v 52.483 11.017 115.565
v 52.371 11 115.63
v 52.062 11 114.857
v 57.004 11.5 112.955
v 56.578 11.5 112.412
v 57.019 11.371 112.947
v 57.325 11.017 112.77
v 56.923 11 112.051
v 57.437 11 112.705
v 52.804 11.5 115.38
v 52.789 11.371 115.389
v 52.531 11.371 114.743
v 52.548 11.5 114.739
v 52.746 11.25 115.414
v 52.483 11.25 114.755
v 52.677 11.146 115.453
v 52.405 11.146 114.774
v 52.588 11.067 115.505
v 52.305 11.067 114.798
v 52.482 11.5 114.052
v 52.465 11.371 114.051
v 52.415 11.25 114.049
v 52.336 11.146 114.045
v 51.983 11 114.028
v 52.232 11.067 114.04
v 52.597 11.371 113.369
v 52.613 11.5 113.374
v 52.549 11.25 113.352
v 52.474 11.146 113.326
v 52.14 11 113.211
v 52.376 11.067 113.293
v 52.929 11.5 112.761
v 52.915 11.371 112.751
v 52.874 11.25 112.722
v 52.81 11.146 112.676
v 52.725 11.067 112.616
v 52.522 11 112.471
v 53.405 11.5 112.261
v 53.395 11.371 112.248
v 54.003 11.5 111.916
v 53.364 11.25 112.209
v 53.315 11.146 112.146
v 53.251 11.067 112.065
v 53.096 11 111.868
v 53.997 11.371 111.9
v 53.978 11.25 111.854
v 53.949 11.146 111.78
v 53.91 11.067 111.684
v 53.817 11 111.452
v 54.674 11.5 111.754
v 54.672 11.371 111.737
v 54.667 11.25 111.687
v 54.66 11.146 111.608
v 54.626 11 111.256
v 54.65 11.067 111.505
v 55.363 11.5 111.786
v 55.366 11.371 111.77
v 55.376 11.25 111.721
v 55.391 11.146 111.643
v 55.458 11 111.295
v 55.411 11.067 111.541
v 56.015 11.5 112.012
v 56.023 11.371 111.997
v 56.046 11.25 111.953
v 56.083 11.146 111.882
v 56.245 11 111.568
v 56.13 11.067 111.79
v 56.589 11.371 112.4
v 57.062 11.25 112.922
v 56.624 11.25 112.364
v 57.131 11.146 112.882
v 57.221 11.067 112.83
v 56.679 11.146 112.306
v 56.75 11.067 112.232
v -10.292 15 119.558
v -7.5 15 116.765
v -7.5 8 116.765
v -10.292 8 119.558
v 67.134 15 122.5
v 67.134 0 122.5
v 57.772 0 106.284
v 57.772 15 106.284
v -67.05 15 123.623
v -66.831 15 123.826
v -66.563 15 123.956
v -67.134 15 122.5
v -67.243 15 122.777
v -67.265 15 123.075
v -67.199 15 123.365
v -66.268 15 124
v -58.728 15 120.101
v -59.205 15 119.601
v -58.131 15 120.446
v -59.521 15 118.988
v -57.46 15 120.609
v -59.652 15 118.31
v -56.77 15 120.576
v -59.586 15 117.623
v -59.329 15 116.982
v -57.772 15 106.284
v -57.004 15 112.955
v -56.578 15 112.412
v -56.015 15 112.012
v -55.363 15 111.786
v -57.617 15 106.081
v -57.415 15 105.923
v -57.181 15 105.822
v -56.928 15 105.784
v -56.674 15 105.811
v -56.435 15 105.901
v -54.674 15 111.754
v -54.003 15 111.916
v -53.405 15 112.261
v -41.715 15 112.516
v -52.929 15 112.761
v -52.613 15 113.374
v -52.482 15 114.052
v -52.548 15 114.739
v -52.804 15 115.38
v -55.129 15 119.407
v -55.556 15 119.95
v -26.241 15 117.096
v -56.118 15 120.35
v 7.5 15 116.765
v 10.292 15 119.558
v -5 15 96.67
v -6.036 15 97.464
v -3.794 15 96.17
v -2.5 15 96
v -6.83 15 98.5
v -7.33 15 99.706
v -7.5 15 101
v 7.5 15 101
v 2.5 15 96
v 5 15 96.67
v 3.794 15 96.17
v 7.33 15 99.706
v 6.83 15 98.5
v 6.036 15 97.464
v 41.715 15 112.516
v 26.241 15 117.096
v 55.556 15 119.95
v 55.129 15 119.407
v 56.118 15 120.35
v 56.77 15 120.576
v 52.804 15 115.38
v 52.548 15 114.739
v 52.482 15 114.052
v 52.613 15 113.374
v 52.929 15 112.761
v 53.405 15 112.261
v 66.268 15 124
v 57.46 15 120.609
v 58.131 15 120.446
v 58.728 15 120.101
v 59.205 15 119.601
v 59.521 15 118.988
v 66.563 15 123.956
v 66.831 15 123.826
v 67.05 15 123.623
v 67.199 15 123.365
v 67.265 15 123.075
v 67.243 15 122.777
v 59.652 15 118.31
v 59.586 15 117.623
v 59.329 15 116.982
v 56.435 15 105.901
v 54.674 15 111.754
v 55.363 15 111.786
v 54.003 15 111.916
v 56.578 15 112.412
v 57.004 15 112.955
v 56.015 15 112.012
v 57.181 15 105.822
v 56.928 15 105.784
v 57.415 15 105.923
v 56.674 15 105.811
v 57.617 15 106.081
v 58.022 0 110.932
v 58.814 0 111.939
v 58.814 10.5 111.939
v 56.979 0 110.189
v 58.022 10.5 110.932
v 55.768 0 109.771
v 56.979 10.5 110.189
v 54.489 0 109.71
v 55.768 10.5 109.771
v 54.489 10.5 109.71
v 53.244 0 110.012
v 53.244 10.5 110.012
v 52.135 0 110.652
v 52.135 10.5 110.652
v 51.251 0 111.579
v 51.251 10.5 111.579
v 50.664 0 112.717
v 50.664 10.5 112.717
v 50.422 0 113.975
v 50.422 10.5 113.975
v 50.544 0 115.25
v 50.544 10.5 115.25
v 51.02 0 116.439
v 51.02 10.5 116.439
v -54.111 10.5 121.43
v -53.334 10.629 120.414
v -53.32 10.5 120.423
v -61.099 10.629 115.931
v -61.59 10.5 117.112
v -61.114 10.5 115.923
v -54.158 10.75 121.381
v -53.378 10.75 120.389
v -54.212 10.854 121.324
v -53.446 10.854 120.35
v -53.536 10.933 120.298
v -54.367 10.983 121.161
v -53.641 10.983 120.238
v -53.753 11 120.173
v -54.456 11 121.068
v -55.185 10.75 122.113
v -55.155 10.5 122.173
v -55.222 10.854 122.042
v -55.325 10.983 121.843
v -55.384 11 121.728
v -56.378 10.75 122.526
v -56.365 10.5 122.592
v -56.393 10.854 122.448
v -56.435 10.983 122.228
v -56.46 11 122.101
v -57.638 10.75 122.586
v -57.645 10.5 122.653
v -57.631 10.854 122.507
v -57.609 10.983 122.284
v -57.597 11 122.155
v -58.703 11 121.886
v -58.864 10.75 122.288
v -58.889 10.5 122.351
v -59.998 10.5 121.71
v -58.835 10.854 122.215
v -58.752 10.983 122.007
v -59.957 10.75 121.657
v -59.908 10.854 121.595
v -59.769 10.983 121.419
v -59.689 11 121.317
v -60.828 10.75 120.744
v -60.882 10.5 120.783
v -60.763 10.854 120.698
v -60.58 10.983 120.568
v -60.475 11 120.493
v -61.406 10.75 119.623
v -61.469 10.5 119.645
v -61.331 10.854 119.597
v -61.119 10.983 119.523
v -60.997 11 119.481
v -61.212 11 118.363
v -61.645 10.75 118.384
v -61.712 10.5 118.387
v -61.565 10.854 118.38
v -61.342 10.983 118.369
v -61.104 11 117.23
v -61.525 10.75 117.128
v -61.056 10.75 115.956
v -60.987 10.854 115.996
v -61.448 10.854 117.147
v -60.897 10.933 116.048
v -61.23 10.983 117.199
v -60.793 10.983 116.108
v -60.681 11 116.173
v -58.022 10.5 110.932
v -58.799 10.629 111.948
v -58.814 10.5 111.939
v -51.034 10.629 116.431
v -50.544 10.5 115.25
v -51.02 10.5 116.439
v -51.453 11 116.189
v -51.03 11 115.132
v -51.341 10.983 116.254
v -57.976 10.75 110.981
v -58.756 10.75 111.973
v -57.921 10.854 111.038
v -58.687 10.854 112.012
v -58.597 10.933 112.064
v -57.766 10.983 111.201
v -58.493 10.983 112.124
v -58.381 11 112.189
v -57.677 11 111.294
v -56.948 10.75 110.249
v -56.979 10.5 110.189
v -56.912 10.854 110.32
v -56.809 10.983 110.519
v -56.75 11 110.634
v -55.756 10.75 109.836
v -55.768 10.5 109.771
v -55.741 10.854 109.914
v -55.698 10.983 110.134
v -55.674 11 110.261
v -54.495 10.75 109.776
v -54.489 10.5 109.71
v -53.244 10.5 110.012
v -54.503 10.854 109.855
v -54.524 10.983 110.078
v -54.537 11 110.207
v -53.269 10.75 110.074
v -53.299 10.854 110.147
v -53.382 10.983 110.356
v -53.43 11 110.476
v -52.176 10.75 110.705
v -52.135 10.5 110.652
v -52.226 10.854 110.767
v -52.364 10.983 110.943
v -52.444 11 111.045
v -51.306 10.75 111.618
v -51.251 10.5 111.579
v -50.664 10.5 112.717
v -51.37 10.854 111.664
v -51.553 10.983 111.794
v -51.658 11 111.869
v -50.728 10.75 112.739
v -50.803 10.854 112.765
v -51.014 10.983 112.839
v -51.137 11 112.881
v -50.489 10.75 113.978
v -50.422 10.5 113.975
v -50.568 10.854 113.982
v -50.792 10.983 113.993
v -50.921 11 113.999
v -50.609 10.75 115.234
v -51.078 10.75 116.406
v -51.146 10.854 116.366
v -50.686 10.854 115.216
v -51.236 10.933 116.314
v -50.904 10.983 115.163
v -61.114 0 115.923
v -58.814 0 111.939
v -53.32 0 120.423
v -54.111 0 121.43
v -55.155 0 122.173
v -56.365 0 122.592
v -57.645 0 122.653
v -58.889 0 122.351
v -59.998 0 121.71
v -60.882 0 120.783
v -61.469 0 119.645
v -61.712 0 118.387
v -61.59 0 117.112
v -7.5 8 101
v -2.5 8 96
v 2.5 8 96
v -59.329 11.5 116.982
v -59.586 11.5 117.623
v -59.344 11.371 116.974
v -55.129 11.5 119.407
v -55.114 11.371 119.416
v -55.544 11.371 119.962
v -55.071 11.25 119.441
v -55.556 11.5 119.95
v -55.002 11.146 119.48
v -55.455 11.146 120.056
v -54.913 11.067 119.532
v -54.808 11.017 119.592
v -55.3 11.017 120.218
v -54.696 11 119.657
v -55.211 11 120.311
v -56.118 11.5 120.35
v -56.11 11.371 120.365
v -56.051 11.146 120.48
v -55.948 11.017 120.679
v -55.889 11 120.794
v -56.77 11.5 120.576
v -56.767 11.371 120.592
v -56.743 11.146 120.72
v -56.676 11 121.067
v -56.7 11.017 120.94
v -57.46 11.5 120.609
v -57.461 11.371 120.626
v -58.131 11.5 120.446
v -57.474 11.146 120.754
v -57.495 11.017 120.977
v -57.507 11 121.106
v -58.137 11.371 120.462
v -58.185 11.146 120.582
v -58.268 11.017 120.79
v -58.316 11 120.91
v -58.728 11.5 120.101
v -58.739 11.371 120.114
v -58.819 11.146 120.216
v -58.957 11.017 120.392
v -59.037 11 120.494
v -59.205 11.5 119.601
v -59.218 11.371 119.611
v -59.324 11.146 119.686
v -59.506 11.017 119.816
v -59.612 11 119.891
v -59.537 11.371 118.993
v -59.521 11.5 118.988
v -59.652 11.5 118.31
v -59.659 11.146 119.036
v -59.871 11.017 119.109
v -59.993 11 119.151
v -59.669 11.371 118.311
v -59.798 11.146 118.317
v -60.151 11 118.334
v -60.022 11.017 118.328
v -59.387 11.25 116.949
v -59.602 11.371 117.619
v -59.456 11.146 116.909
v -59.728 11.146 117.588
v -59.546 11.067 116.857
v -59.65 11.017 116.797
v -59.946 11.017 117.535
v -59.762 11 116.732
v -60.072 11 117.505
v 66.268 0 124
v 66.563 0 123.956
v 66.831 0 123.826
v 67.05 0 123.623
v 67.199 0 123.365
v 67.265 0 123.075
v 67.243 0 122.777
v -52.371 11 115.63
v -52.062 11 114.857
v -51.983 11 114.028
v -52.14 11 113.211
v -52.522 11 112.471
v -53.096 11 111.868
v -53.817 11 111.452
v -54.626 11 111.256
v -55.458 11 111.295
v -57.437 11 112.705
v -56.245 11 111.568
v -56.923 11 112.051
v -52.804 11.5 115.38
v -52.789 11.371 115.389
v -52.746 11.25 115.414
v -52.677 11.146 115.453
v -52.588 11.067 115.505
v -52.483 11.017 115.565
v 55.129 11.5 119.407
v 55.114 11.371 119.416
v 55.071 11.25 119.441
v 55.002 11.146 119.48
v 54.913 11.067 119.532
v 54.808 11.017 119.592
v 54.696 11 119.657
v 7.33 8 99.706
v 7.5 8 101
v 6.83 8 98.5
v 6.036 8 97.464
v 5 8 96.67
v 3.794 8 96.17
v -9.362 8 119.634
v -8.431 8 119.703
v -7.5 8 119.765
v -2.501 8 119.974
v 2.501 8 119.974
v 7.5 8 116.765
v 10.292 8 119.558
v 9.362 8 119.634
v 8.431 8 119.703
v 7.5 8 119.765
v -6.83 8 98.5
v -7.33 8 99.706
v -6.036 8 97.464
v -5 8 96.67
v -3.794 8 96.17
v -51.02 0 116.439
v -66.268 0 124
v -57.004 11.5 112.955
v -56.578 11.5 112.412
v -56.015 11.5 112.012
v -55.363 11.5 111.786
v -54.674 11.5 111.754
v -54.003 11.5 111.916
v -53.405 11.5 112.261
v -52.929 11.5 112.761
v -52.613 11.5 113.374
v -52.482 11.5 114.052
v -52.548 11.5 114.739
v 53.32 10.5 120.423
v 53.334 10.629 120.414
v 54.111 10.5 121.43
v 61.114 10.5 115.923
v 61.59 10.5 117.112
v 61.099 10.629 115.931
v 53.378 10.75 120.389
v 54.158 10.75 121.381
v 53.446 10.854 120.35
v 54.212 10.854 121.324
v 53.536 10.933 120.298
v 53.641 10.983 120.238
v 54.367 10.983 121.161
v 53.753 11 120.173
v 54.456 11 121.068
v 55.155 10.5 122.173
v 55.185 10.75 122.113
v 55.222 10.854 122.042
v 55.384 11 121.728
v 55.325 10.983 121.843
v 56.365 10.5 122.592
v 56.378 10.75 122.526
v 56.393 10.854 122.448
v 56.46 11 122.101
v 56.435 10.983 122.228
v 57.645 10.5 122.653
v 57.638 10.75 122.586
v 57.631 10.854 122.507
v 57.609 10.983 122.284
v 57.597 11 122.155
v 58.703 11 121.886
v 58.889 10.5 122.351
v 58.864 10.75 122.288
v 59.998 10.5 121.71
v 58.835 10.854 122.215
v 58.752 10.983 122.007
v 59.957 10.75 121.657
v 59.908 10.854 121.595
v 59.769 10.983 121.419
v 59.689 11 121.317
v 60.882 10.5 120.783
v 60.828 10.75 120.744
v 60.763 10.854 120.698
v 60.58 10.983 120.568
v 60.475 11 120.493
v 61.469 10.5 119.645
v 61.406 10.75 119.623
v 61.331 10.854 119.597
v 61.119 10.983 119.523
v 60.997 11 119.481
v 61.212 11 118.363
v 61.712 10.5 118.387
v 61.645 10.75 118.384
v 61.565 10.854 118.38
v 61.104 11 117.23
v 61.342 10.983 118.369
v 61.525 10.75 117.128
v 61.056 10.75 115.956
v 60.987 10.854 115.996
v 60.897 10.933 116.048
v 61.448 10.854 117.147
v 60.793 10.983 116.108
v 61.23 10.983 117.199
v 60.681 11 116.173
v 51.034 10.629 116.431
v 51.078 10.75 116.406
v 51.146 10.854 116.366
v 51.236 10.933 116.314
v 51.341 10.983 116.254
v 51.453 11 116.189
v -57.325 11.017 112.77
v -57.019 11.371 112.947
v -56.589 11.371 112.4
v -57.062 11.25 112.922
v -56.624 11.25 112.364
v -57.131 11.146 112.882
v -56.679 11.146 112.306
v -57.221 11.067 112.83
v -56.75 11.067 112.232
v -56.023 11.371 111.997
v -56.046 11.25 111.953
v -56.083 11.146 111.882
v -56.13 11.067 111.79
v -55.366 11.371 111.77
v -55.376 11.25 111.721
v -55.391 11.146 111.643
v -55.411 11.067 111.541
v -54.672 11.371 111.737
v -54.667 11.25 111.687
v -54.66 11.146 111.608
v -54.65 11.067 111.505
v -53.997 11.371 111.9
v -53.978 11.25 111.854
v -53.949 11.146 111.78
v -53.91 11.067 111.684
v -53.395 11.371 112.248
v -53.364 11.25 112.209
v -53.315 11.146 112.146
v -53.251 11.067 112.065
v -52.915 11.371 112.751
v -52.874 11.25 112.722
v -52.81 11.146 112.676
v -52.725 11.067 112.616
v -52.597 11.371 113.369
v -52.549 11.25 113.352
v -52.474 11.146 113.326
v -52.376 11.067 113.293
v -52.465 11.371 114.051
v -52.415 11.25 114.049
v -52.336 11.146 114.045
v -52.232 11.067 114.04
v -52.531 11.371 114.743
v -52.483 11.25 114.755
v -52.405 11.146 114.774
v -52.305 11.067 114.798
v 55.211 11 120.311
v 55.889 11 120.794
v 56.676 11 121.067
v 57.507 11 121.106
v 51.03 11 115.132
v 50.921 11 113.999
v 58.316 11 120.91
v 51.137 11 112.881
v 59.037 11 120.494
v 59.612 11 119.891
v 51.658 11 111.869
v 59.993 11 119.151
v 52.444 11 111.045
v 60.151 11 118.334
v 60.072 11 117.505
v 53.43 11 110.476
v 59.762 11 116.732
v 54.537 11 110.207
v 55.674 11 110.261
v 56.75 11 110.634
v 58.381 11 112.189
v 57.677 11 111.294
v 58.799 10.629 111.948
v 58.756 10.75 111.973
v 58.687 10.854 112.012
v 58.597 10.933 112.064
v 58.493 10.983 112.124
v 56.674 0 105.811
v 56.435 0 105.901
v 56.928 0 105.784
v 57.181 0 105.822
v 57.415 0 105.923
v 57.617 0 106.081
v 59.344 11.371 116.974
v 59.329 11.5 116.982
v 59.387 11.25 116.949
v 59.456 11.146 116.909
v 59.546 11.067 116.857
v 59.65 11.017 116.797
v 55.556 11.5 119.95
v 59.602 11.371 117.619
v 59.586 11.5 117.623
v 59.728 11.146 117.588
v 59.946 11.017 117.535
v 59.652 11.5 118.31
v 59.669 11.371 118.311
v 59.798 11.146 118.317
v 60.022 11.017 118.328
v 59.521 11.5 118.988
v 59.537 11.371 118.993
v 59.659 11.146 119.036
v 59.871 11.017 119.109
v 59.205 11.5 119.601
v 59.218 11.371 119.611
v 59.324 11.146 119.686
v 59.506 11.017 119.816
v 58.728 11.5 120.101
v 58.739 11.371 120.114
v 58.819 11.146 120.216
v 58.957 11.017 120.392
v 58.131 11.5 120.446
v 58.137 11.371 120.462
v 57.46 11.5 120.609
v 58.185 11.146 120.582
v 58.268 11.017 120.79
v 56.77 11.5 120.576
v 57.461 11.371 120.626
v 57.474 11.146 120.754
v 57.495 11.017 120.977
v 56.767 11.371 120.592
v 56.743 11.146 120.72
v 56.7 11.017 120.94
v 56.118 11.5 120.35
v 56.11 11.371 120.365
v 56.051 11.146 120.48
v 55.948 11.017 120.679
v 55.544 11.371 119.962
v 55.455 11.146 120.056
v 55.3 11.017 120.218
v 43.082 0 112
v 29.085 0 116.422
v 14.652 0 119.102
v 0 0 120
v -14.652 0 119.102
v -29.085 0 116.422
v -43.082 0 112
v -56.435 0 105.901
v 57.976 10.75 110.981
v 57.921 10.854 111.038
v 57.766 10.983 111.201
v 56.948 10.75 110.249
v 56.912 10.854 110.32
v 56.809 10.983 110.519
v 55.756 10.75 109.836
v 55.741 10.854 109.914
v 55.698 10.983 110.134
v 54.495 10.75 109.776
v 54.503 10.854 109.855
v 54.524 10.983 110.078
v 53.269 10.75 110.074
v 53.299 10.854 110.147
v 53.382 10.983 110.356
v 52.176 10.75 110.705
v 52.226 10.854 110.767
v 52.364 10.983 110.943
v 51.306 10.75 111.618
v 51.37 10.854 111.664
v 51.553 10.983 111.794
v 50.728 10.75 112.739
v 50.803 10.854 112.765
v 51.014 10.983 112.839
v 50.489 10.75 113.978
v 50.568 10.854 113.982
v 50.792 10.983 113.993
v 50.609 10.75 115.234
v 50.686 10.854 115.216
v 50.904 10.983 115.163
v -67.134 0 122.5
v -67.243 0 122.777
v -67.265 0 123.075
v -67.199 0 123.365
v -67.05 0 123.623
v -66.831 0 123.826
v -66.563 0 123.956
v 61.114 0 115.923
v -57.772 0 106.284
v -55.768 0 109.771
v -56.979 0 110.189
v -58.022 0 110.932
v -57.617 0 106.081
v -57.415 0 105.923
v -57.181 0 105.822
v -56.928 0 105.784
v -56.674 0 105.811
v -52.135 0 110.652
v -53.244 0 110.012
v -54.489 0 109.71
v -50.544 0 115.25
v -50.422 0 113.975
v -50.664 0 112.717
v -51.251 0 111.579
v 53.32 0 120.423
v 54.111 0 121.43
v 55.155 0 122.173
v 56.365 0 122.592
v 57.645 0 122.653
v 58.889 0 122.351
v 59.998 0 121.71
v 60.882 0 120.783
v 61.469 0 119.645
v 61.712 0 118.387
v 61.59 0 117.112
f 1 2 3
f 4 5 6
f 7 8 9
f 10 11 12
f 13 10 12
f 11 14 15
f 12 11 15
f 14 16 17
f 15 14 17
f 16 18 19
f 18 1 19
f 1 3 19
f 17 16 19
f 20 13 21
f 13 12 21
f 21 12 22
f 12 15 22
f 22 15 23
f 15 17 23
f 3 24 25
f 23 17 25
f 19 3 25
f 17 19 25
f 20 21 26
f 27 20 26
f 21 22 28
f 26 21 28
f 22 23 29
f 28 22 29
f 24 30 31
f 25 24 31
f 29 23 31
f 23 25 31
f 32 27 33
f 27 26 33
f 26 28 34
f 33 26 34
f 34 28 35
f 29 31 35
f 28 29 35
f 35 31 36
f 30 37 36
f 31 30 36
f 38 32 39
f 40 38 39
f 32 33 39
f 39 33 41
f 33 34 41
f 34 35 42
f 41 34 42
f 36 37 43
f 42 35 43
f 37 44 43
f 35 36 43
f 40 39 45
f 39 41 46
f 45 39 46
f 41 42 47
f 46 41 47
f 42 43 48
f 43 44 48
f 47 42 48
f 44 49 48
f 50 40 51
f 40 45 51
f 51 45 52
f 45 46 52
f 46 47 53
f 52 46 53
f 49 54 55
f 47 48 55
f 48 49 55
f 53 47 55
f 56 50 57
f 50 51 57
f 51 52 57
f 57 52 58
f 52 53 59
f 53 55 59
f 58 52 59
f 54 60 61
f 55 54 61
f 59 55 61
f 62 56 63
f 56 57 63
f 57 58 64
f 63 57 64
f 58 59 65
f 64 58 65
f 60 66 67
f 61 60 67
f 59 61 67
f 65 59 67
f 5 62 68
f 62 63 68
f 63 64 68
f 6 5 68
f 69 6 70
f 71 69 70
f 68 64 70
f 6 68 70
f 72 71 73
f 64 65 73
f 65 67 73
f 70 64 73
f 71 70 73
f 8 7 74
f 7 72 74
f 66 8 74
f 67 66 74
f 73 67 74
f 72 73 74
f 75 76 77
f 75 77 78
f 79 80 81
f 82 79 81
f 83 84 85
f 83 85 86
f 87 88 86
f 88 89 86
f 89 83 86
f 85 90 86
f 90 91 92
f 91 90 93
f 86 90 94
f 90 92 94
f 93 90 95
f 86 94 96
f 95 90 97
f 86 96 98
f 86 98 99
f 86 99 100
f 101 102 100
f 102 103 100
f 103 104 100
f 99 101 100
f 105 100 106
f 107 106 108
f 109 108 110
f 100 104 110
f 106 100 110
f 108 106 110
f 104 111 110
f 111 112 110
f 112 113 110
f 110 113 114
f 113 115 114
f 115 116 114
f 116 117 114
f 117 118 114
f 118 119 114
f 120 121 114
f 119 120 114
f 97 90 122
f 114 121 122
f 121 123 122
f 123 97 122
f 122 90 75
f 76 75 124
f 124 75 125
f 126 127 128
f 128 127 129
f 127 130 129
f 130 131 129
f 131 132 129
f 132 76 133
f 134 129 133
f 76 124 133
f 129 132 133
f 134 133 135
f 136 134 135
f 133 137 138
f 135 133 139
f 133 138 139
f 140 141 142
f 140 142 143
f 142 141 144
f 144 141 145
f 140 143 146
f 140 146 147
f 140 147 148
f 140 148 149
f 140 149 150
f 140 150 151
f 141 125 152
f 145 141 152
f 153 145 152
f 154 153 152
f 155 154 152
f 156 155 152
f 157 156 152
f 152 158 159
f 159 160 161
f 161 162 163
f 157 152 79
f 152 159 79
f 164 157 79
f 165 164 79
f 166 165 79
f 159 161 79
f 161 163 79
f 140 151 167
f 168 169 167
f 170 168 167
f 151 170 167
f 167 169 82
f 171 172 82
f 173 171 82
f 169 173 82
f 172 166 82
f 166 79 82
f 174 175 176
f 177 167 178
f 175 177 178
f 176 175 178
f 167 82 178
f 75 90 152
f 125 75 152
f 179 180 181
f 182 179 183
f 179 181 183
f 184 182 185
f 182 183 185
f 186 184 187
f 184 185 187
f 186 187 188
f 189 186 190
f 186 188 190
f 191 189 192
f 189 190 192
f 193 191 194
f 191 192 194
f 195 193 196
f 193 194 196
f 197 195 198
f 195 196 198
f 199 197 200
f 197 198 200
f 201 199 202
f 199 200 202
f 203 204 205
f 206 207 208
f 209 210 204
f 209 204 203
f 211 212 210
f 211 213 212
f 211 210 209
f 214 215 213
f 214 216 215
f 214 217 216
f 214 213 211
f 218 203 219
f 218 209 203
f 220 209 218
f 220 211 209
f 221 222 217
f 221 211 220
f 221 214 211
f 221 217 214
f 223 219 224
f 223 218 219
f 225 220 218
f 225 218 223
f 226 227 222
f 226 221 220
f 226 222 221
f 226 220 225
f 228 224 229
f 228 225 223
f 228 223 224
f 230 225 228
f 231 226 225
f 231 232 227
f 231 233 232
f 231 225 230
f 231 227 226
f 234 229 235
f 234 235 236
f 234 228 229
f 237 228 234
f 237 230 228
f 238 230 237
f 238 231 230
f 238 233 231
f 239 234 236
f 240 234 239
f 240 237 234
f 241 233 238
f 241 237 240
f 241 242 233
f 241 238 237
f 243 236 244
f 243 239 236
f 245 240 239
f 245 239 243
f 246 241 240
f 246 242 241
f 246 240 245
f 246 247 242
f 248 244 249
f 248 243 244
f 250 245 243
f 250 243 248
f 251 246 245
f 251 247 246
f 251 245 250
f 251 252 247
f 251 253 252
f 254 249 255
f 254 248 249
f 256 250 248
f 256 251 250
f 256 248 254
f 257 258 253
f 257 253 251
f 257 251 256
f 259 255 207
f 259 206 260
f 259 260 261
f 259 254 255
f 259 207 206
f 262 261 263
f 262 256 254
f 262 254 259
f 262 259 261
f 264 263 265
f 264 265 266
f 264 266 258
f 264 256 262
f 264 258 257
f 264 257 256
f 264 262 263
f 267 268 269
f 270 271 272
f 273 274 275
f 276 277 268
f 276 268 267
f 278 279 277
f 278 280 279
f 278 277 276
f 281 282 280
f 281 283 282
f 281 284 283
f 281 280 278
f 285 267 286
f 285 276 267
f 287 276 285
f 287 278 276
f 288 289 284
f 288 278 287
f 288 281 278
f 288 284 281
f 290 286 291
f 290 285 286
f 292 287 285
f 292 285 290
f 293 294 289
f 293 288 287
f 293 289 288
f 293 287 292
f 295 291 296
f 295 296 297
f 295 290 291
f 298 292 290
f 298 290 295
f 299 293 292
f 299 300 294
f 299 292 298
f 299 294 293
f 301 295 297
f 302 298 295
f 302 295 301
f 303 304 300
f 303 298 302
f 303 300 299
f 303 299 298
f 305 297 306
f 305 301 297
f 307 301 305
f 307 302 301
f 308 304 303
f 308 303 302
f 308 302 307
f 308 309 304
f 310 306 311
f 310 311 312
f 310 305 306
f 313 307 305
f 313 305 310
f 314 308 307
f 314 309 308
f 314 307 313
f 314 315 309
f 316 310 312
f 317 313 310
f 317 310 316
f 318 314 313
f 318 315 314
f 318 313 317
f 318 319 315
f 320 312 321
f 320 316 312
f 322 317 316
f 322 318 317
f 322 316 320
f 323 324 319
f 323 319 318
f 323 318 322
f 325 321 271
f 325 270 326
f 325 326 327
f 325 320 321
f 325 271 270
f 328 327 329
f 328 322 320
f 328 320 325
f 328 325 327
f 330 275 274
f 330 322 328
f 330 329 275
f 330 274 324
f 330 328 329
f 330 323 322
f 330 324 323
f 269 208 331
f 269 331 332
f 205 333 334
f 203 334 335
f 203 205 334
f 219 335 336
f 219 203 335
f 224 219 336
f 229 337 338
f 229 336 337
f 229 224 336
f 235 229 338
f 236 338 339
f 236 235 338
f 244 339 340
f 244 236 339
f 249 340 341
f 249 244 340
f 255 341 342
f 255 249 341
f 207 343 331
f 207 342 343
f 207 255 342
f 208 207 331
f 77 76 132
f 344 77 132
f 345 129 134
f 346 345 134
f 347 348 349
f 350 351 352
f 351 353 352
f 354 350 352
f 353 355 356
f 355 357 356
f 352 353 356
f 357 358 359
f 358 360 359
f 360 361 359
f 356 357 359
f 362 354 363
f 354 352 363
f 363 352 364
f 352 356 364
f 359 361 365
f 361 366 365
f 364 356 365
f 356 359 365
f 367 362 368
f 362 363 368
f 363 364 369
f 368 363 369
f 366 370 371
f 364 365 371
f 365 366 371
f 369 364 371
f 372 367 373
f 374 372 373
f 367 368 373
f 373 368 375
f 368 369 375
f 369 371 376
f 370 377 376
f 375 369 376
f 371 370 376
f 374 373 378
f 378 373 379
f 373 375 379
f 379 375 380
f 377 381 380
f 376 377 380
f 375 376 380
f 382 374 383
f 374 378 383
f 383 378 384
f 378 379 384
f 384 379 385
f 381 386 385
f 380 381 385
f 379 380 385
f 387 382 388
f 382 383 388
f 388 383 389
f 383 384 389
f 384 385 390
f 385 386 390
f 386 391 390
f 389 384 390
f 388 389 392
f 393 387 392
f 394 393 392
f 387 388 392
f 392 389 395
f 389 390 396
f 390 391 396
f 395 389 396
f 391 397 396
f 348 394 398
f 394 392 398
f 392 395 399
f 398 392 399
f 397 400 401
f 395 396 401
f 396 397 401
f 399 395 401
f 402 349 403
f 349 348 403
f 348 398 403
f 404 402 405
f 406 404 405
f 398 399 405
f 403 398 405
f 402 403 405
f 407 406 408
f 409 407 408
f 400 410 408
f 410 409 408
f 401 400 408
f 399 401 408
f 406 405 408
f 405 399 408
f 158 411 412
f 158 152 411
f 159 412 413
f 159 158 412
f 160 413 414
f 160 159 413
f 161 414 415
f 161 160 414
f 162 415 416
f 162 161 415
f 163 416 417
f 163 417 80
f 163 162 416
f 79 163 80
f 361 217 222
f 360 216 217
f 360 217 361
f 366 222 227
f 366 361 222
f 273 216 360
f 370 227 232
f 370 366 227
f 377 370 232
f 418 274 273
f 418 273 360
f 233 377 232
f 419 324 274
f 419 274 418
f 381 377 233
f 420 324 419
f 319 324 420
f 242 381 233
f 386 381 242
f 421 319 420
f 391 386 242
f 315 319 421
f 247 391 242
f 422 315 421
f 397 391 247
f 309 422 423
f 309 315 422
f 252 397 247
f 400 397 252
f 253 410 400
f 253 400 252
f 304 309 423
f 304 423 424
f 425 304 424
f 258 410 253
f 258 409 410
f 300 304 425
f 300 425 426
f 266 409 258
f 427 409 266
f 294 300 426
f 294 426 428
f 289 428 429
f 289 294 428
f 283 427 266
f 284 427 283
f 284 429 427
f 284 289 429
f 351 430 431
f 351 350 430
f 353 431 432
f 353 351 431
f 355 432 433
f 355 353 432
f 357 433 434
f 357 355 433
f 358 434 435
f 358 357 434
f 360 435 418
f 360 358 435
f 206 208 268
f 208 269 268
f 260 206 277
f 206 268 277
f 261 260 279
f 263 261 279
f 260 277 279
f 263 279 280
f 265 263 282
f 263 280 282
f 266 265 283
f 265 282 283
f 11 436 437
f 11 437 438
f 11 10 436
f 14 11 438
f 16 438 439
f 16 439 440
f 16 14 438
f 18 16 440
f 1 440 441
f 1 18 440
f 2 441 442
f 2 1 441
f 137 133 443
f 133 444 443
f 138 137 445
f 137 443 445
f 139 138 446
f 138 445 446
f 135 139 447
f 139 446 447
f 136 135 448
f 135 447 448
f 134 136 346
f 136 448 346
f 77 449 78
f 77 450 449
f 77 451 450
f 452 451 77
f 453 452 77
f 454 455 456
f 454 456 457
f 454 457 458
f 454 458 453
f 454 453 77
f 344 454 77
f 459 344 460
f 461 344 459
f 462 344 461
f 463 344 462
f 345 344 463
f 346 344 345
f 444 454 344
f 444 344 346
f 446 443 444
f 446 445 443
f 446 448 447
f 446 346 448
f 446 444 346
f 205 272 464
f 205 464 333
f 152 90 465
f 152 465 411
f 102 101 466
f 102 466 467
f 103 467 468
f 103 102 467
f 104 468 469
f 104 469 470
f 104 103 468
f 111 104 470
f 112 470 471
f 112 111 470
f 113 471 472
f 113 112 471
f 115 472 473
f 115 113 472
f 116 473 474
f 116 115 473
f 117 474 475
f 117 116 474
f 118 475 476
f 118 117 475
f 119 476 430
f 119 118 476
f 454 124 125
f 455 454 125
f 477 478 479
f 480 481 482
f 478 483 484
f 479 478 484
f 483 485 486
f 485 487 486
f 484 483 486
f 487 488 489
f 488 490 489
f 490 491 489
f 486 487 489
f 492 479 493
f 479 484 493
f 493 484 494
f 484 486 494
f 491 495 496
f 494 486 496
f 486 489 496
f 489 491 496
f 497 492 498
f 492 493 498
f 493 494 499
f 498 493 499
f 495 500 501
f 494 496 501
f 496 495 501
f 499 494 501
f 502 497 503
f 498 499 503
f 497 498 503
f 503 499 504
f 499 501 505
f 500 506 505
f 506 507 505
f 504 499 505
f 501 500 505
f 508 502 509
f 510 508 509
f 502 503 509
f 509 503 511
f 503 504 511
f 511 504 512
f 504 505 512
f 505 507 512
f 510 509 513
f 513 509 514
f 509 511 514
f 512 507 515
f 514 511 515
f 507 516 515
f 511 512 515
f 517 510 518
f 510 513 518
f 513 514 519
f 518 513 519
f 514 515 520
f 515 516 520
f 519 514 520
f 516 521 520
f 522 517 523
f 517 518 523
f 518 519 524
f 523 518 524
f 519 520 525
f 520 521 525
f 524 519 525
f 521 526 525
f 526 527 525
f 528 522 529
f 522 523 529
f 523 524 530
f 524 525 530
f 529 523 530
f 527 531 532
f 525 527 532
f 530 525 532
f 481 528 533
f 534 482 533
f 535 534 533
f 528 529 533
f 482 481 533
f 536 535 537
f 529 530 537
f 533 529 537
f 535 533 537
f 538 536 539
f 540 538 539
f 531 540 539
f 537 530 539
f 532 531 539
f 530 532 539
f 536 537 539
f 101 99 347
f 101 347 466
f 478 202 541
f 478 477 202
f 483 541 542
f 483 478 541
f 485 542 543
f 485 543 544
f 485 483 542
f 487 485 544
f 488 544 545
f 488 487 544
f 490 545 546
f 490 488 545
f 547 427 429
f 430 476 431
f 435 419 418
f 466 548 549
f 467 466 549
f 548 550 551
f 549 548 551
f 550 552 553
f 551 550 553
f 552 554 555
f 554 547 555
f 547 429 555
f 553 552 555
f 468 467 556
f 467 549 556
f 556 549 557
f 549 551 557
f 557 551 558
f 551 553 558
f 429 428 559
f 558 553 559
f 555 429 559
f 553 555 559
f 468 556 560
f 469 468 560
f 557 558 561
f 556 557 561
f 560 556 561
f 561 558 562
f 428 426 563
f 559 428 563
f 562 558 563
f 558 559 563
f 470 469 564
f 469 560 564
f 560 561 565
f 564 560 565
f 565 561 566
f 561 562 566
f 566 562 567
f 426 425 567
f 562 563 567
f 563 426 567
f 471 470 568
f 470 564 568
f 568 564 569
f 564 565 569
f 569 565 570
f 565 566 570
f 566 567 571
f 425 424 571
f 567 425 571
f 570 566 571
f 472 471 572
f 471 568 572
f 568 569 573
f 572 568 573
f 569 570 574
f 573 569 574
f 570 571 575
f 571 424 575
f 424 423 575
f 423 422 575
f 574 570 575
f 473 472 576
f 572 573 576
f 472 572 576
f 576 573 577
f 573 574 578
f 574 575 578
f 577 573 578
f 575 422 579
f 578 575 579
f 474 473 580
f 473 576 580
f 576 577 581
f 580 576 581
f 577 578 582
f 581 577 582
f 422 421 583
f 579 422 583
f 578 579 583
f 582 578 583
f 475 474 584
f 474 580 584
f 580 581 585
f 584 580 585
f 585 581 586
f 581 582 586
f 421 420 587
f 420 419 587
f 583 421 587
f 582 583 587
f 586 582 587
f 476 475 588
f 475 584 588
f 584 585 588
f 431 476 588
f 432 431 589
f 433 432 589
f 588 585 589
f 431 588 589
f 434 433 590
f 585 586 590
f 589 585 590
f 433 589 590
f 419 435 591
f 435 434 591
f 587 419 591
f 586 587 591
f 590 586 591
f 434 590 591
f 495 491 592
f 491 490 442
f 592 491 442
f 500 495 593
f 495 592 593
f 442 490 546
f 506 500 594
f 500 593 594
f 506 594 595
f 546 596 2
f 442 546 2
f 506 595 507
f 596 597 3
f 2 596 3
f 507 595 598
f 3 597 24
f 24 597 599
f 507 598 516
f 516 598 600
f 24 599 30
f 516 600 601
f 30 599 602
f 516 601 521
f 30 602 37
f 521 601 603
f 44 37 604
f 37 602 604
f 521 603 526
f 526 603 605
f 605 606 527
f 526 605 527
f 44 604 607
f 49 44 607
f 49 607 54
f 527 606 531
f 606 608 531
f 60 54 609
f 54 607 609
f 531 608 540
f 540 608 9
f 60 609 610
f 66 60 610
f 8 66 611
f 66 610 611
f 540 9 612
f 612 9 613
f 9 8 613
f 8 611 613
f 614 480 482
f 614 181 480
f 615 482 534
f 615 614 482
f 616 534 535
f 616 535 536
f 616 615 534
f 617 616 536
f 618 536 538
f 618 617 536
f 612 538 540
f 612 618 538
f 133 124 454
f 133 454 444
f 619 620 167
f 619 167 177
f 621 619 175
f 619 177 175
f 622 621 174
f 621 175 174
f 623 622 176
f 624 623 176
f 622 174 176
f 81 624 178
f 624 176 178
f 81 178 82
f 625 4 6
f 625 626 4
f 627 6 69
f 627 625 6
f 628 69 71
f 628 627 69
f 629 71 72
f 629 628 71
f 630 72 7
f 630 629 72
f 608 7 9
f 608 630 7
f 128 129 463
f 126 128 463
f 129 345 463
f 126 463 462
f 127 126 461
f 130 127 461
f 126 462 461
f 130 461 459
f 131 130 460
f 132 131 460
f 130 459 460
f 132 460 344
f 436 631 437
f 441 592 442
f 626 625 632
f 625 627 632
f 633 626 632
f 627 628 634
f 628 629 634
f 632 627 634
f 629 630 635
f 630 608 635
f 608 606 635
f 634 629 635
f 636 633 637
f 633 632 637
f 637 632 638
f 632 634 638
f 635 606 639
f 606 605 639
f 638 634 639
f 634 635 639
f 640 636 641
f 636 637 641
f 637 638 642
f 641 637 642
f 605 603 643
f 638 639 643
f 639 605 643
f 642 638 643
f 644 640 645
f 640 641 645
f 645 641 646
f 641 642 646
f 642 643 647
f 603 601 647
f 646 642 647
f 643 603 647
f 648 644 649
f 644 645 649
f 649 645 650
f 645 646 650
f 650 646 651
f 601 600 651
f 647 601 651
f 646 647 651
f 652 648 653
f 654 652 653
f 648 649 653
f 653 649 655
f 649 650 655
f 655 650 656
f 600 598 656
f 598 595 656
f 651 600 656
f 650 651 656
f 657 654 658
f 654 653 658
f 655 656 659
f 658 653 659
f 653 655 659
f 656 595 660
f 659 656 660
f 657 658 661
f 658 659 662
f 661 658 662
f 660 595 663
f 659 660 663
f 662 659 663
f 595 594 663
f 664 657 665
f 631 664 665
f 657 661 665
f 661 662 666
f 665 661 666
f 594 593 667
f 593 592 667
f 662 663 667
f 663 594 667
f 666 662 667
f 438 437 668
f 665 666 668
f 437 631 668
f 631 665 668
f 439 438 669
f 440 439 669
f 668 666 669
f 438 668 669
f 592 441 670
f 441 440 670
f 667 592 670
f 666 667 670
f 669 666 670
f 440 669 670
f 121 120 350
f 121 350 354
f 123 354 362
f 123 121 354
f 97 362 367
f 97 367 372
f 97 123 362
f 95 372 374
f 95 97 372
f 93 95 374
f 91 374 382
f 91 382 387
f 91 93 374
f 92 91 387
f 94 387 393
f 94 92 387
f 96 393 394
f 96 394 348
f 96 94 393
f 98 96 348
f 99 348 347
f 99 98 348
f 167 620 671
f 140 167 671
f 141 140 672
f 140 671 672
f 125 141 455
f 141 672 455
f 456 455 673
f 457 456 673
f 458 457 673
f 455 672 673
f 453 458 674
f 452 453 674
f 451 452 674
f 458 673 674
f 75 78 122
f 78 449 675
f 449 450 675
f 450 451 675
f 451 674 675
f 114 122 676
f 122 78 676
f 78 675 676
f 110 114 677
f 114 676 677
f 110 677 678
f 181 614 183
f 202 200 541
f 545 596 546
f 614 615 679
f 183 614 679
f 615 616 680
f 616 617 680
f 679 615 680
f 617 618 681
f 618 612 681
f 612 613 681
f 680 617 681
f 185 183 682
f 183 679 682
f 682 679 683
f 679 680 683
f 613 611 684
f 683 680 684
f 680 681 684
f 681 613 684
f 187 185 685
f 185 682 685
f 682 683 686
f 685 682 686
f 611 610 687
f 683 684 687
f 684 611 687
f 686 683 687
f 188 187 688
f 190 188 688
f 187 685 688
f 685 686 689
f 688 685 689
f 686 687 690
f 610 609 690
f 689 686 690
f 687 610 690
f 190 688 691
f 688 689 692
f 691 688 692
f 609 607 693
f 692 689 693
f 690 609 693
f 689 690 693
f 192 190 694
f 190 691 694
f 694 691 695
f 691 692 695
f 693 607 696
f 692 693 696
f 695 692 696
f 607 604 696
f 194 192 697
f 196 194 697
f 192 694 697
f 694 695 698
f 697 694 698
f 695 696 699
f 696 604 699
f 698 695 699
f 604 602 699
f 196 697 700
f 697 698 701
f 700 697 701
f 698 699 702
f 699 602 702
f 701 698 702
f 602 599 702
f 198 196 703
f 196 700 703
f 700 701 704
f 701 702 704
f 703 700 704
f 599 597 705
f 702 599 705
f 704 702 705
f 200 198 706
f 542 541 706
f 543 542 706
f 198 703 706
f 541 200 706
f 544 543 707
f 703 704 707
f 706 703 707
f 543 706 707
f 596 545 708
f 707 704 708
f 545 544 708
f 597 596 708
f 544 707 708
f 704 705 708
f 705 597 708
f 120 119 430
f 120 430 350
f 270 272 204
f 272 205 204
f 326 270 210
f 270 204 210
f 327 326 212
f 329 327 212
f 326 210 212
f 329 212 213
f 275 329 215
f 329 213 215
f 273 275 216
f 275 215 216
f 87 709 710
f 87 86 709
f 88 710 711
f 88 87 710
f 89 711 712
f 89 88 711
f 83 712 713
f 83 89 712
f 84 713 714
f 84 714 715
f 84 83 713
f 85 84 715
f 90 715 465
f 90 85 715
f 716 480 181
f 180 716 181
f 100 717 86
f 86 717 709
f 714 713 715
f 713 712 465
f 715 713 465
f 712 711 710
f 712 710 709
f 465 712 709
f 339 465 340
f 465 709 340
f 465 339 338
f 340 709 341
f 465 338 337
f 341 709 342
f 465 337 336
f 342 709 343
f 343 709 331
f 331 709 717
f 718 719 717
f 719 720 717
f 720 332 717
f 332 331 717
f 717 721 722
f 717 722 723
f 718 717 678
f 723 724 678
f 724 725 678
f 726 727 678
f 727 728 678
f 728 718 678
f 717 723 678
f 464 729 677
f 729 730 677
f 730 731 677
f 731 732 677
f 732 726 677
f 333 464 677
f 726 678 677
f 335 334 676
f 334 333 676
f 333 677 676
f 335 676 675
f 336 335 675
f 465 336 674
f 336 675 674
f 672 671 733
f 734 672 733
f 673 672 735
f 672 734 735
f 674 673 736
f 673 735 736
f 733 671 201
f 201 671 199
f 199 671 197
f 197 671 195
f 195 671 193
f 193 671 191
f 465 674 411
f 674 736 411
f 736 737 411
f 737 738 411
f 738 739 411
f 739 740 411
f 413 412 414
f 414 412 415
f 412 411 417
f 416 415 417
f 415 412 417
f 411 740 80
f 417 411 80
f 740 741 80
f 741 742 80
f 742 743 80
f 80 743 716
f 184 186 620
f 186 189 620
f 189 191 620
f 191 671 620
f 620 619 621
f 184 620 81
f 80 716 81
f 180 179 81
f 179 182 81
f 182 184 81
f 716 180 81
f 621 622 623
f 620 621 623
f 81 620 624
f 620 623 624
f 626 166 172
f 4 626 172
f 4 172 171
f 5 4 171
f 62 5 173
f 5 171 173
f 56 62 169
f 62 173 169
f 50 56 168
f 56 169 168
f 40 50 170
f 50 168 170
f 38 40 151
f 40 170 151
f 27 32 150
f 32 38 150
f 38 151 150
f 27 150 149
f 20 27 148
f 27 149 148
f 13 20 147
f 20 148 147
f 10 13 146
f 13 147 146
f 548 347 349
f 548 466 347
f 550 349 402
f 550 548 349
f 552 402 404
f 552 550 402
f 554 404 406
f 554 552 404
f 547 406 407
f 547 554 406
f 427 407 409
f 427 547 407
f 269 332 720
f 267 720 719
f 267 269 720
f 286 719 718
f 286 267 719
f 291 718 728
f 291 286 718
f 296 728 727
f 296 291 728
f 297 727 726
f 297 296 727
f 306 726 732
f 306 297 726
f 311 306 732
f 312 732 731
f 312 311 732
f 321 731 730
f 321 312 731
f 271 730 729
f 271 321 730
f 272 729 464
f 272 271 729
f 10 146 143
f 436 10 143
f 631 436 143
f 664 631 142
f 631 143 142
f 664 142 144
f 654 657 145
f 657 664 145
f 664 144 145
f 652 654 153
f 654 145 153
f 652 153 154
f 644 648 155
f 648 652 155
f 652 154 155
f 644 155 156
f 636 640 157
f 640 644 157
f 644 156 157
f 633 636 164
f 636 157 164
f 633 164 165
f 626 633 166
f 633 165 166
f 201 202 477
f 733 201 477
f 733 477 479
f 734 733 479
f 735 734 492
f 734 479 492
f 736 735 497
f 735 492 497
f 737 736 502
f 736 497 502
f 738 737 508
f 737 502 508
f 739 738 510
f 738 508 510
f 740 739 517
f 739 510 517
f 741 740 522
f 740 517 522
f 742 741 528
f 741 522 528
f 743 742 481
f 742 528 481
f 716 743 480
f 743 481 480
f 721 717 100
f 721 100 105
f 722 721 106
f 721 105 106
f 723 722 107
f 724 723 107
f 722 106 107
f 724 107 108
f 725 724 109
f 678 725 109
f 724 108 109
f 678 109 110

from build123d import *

# Parameters (mm, degrees)
BOSS_EXTRUDE1_DEPTH = 15
CUT_EXTRUDE1_DEPTH  = 143.214626533
CUT_EXTRUDE3_START  = -4
CUT_EXTRUDE3_DEPTH  = 139.214626533
FILLET1_R           = 1
FILLET2_R           = 0.5
SKETCH4_W           = 15
SKETCH4_H           = 28
BOSS_EXTRUDE2_DEPTH = 7
CHAMFER1_SIZE       = 3
FILLET3_R           = 5


with BuildPart() as part:
    # Sketch1 → Boss-Extrude1 (new body)
    with BuildSketch(Plane(origin=(0, 0, 0), x_dir=(1, 0, 0), z_dir=(0, 1, 0))):
        with BuildLine():
            Line((-57.286267839, -105.443271559), (-68, -124))
            Line((-68, -124), (68, -124))
            Line((68, -124), (57.286267839, -105.443271559))
            ThreePointArc((57.286267839, -105.443271559), (0, -120), (-57.286267839, -105.443271559))
        make_face()
    extrude(amount=BOSS_EXTRUDE1_DEPTH)

    # Sketch2 → Cut-Extrude1 (cut, through all)
    with BuildSketch(Plane(origin=(0, 15, 0), x_dir=(1, 0, 0), z_dir=(0, 1, 0))):
        with BuildLine():
            Line((-52.804159001, -115.380031326), (-55.129159001, -119.407049454))
            ThreePointArc((-55.129159001, -119.407049454), (-58.441770605, -120.294661058), (-59.32938221, -116.982049454))
            Line((-59.32938221, -116.982049454), (-57.00438221, -112.955031326))
            ThreePointArc((-57.00438221, -112.955031326), (-53.691770605, -112.067419722), (-52.804159001, -115.380031326))
        make_face()
        with BuildLine():
            Line((52.804159001, -115.380031326), (55.129159001, -119.407049454))
            ThreePointArc((55.129159001, -119.407049454), (58.441770605, -120.294661058), (59.32938221, -116.982049454))
            Line((59.32938221, -116.982049454), (57.00438221, -112.955031326))
            ThreePointArc((57.00438221, -112.955031326), (53.691770605, -112.067419722), (52.804159001, -115.380031326))
        make_face()
    extrude(amount=-CUT_EXTRUDE1_DEPTH, mode=Mode.SUBTRACT)

    # Sketch3 → Cut-Extrude3 (cut, through all)
    with BuildSketch(Plane(origin=(0, 15, 0), x_dir=(1, 0, 0), z_dir=(0, 1, 0)).offset(CUT_EXTRUDE3_START)):
        with BuildLine():
            Line((-51.019656288, -116.439181962), (-53.319656288, -120.422898819))
            ThreePointArc((-53.319656288, -120.422898819), (-59.466770605, -122.070013136), (-61.113884922, -115.922898819))
            Line((-61.113884922, -115.922898819), (-58.813884922, -111.939181962))
            ThreePointArc((-58.813884922, -111.939181962), (-52.666770605, -110.292067644), (-51.019656288, -116.439181962))
        make_face()
        with BuildLine():
            Line((51.019656288, -116.439181962), (53.319656288, -120.422898819))
            ThreePointArc((53.319656288, -120.422898819), (59.466770605, -122.070013136), (61.113884922, -115.922898819))
            Line((61.113884922, -115.922898819), (58.813884922, -111.939181962))
            ThreePointArc((58.813884922, -111.939181962), (52.666770605, -110.292067644), (51.019656288, -116.439181962))
        make_face()
    extrude(amount=-CUT_EXTRUDE3_DEPTH, mode=Mode.SUBTRACT)

    # Fillet1
    fillet1_edges = [part.edges().sort_by_distance(p)[0] for p in [
        (57.286267839, 7.5, 105.443271559),
        (68, 7.5, 124),
        (-68, 7.5, 124),
        (-57.286267839, 7.5, 105.443271559),
    ]]
    fillet(fillet1_edges, radius=FILLET1_R)

    # Fillet2
    fillet2_edges = [part.edges().sort_by_distance(p)[0] for p in [
        (-58.16688221, 11, 114.96854039),
        (53.966659001, 11, 117.39354039),
        (-52.666770605, 11, 110.292067644),
        (-59.963884922, 11, 113.93104039),
        (-59.466770605, 11, 122.070013136),
        (-52.169656288, 11, 118.43104039),
        (-53.691770605, 11, 112.067419722),
        (-53.966659001, 11, 117.39354039),
        (-58.441770605, 11, 120.294661058),
        (52.666770605, 11, 110.292067644),
        (52.169656288, 11, 118.43104039),
        (59.466770605, 11, 122.070013136),
        (59.963884922, 11, 113.93104039),
        (58.16688221, 11, 114.96854039),
        (53.691770605, 11, 112.067419722),
        (58.441770605, 11, 120.294661058),
    ]]
    fillet(fillet2_edges, radius=FILLET2_R)

    # Sketch4 → Boss-Extrude2 (add)
    with BuildSketch(Plane(origin=(0, 15, 0), x_dir=(1, 0, 0), z_dir=(0, 1, 0))):
        with Locations((0, -110)):
            Rectangle(SKETCH4_W, SKETCH4_H)
    extrude(amount=-BOSS_EXTRUDE2_DEPTH)

    # Chamfer1
    # the kernel refuses this chamfer: 3, 2.828734379 mm, written as the material it adds along each edge
    with BuildSketch(Plane(origin=(-7.5, 15, 119.76539567), x_dir=(0, 0, -1), z_dir=(0, -1, 0))) as chamfer1_piece_1:
        with BuildLine():
            Line((CHAMFER1_SIZE, 0), (0.207600012, -2.792399988))
            ThreePointArc((0.207600012, -2.792399988), (0.098564019, -1.43584929), (0, 0))
            Line((0, 0), (CHAMFER1_SIZE, 0))
        make_face()
    extrude(amount=7)
    with BuildSketch(Plane(origin=(7.5, 15, 119.76539567), x_dir=(0, 0, -1), z_dir=(0, -1, 0))) as chamfer1_piece_2:
        with BuildLine():
            Line((CHAMFER1_SIZE, 0), (0.207600012, 2.792399988))
            ThreePointArc((0.207600012, 2.792399988), (0.098564019, 1.43584929), (0, 0))
            Line((0, 0), (CHAMFER1_SIZE, 0))
        make_face()
    extrude(amount=7)

    # Fillet3
    fillet3_edges = [part.edges().sort_by_distance(p)[0] for p in [
        (7.5, 11.5, 96),
        (-7.5, 11.5, 96),
    ]]
    fillet(fillet3_edges, radius=FILLET3_R)


solid = part.part
